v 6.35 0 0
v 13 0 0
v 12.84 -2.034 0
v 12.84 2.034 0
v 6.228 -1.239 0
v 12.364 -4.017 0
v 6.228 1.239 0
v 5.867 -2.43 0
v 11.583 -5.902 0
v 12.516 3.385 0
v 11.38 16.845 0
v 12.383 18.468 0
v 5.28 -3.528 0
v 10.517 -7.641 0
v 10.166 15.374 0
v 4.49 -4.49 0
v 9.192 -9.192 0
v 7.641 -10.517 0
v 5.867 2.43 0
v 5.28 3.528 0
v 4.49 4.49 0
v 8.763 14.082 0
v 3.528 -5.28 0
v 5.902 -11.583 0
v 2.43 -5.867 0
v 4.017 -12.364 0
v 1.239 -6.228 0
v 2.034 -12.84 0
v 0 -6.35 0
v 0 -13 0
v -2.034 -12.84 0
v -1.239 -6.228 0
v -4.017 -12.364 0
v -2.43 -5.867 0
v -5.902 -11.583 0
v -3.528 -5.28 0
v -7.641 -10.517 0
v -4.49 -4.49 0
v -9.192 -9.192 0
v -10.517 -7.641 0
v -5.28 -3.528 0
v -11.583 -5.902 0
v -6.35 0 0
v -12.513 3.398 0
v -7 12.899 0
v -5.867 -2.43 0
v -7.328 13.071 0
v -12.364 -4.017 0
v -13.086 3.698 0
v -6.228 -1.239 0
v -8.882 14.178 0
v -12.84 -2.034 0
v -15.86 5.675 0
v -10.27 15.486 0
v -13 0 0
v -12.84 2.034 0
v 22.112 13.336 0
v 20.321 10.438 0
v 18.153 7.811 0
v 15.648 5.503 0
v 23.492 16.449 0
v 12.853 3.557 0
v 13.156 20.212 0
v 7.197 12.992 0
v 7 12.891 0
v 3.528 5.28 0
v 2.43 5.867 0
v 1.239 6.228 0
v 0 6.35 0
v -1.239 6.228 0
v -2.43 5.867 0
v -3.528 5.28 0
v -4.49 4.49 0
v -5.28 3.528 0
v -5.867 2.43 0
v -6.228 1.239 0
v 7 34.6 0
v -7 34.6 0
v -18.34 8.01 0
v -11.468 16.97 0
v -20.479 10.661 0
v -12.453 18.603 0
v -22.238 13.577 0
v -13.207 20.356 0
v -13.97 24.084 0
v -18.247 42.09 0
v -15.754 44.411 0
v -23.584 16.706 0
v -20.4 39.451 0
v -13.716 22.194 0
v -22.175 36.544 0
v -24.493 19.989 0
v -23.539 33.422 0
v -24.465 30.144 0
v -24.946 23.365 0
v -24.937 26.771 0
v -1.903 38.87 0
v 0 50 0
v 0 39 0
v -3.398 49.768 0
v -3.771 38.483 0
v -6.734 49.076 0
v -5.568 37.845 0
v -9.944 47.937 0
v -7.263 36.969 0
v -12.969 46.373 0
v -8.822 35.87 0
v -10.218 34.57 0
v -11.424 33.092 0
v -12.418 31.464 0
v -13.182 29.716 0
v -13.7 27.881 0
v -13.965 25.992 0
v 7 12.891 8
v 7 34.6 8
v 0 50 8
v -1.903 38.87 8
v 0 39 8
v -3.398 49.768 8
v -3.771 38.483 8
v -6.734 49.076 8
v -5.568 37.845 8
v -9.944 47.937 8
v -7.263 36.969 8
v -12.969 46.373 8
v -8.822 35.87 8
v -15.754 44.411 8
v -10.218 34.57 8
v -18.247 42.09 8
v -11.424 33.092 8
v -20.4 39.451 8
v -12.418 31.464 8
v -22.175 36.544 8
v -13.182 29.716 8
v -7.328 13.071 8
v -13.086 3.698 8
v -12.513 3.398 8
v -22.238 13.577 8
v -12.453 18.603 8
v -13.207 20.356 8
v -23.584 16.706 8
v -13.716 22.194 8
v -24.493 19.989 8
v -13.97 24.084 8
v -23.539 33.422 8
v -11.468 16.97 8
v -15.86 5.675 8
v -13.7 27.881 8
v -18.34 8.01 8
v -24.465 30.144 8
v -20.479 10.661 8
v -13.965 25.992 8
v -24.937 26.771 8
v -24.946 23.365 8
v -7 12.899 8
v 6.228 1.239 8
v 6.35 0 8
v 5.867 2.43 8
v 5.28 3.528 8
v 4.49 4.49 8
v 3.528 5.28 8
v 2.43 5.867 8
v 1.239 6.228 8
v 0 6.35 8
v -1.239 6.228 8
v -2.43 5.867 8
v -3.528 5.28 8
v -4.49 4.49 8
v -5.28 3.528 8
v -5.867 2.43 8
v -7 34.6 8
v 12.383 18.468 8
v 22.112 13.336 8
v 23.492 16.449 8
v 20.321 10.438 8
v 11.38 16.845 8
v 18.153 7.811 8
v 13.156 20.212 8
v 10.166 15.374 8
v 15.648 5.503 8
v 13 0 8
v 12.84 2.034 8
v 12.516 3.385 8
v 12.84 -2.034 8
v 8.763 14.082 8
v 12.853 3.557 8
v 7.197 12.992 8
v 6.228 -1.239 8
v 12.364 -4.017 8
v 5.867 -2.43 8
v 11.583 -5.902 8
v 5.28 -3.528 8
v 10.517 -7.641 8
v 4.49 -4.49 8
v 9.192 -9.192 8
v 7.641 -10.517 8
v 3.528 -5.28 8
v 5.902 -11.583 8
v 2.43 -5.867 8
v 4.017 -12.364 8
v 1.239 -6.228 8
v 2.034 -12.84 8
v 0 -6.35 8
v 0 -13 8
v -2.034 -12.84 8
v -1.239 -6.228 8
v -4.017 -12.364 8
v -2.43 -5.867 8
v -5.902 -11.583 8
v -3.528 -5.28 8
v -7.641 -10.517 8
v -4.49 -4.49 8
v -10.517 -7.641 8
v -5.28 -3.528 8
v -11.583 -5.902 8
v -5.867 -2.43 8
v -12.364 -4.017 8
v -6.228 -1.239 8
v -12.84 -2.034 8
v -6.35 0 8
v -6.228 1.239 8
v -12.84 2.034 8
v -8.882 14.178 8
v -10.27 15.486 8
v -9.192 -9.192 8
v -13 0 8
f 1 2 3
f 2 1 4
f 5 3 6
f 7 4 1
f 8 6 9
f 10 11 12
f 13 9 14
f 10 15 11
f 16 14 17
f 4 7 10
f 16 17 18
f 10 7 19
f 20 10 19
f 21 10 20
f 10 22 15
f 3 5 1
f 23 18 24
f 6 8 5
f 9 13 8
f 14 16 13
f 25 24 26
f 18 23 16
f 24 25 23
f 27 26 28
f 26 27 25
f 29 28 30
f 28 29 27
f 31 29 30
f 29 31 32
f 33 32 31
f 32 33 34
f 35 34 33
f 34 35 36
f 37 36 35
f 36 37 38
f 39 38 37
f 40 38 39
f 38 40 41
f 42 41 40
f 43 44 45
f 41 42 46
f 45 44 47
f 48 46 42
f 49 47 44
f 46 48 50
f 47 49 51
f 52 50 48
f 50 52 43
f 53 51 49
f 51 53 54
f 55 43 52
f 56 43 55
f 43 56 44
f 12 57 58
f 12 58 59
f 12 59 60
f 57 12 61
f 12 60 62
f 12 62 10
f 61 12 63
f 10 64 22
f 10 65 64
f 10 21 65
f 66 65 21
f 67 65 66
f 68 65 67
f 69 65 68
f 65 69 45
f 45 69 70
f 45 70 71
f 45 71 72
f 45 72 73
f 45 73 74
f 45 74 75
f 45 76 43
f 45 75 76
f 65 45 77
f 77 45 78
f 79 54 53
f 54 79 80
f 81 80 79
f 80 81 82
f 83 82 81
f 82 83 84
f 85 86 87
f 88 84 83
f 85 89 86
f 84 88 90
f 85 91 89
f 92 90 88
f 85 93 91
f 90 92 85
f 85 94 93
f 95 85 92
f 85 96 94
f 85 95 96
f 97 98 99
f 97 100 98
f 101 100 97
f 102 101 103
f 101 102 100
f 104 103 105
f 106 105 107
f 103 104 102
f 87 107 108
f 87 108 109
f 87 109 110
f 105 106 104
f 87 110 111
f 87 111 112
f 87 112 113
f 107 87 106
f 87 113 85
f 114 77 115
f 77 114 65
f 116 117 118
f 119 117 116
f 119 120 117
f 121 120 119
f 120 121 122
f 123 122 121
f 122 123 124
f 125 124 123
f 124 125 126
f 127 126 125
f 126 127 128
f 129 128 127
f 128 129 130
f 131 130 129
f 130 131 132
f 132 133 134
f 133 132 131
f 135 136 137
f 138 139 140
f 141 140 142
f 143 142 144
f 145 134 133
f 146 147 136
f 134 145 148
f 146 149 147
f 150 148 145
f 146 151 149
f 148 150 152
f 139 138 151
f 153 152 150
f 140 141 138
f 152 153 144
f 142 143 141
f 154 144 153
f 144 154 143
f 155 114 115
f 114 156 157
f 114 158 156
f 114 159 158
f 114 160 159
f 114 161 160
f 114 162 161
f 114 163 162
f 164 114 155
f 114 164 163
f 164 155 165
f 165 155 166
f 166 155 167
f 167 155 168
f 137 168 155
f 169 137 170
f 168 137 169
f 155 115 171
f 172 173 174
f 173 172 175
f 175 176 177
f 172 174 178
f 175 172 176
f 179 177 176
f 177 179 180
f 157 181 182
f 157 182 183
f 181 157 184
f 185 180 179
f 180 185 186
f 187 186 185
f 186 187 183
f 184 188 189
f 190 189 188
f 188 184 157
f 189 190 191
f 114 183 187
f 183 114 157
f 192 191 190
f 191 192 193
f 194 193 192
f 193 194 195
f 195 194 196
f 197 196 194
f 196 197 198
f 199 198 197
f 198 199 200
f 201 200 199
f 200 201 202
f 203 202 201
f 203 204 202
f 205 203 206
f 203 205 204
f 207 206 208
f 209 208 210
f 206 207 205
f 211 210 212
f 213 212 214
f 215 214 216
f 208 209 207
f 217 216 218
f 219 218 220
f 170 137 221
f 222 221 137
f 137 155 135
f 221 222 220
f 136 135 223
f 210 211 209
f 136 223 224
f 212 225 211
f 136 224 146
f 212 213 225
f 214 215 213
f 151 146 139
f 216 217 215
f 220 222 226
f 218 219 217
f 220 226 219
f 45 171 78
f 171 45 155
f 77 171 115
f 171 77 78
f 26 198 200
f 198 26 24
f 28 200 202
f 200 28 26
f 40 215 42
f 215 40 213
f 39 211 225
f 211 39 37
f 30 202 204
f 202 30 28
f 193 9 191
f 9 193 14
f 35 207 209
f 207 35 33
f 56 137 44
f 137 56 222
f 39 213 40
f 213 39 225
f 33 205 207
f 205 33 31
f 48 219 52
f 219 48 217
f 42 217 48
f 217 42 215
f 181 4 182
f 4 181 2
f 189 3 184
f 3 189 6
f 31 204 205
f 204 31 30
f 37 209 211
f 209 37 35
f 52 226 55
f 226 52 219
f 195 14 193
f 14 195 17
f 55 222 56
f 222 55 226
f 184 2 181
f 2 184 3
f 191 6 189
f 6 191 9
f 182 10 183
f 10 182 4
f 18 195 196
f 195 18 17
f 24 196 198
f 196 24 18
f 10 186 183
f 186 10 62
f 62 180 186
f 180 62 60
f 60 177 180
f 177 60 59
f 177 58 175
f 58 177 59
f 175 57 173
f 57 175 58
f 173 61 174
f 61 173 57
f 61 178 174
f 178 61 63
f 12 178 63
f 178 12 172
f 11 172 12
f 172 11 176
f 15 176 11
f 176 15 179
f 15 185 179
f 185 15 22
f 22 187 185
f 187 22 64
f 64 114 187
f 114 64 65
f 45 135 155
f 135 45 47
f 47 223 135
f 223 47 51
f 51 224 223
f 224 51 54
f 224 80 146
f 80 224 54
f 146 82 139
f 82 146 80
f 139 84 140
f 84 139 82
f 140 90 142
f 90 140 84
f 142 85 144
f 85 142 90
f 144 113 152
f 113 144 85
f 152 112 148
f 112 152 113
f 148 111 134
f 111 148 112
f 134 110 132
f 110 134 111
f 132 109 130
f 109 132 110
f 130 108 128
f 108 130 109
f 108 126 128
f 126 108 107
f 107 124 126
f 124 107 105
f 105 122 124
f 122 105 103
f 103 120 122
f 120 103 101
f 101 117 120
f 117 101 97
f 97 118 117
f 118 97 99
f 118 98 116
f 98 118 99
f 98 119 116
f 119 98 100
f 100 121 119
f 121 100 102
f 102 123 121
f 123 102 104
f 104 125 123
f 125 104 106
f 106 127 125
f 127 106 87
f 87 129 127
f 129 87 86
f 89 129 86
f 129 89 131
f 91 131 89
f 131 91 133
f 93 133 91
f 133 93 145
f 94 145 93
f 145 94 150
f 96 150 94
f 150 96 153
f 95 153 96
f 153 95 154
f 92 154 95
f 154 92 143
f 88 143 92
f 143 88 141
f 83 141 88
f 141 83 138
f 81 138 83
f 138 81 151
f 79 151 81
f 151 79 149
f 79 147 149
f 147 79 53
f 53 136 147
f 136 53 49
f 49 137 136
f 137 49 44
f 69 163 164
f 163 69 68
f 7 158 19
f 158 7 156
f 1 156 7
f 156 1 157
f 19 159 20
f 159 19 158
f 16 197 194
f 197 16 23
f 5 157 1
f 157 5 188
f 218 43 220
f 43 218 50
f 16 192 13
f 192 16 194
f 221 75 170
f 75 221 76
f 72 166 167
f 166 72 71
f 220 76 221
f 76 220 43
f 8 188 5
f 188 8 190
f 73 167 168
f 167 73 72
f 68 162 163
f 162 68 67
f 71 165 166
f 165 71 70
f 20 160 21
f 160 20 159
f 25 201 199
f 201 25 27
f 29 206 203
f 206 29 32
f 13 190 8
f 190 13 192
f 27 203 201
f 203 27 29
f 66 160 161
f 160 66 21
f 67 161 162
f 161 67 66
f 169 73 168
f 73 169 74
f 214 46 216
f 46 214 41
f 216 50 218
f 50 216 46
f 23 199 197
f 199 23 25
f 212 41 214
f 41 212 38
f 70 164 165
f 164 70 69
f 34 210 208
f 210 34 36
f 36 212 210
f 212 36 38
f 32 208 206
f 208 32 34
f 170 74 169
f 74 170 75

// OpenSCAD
$fn = 32;

// ----------------------------------------------------------------------
// Hook: 50 mm shank into a 14 mm curl, 8 mm thick
// ----------------------------------------------------------------------

// --- parameters (mm) ---
shank_len = 50;           // shank length from the boss centre
shank_w = 14;             // shank width
boss_d = 26;              // boss diameter
bore_d = 12.7;            // boss bore
curl_in = 14;             // curl inner radius
curl_out = 25;            // curl outer radius
curl_sweep = 250;         // curl sweep angle
hook_t = 8;               // hook thickness

shank_profile = [[-7, 34.6], [7, 34.6], [7, 11], [-7, 11]];
boss_profile = [[13, 0], [12.84, 2.034], [12.364, 4.017], [11.583, 5.902], [10.517, 7.641], [9.192, 9.192], [7.641, 10.517], [5.902, 11.583], [4.017, 12.364], [2.034, 12.84], [0, 13], [-2.034, 12.84], [-4.017, 12.364], [-5.902, 11.583], [-7.641, 10.517], [-9.192, 9.192], [-10.517, 7.641], [-11.583, 5.902], [-12.364, 4.017], [-12.84, 2.034], [-13, 0], [-12.84, -2.034], [-12.364, -4.017], [-11.583, -5.902], [-10.517, -7.641], [-9.192, -9.192], [-7.641, -10.517], [-5.902, -11.583], [-4.017, -12.364], [-2.034, -12.84], [0, -13], [2.034, -12.84], [4.017, -12.364], [5.902, -11.583], [7.641, -10.517], [9.192, -9.192], [10.517, -7.641], [11.583, -5.902], [12.364, -4.017], [12.84, -2.034]];
curl_profile = [[0, 50], [-3.398, 49.768], [-6.734, 49.076], [-9.944, 47.937], [-12.969, 46.373], [-15.754, 44.411], [-18.247, 42.09], [-20.4, 39.451], [-22.175, 36.544], [-23.539, 33.422], [-24.465, 30.144], [-24.937, 26.771], [-24.946, 23.365], [-24.493, 19.989], [-23.584, 16.706], [-22.238, 13.577], [-20.479, 10.661], [-18.34, 8.01], [-15.86, 5.675], [-13.086, 3.698], [-10.069, 2.117], [-6.865, 0.961], [-3.533, 0.251], [-0.136, 0], [3.263, 0.214], [6.602, 0.888], [9.818, 2.009], [12.853, 3.557], [15.648, 5.503], [18.153, 7.811], [20.321, 10.438], [22.112, 13.336], [23.492, 16.449], [13.156, 20.212], [12.383, 18.468], [11.38, 16.845], [10.166, 15.374], [8.763, 14.082], [7.197, 12.992], [5.498, 12.125], [3.697, 11.497], [1.827, 11.12], [-0.076, 11], [-1.979, 11.141], [-3.844, 11.538], [-5.638, 12.186], [-7.328, 13.071], [-8.882, 14.178], [-10.27, 15.486], [-11.468, 16.97], [-12.453, 18.603], [-13.207, 20.356], [-13.716, 22.194], [-13.97, 24.084], [-13.965, 25.992], [-13.7, 27.881], [-13.182, 29.716], [-12.418, 31.464], [-11.424, 33.092], [-10.218, 34.57], [-8.822, 35.87], [-7.263, 36.969], [-5.568, 37.845], [-3.771, 38.483], [-1.903, 38.87], [0, 39]];

difference() {
  union() {
    /* three overlapping outlines: shank, boss and the smooth curl */
    linear_extrude(height = hook_t) polygon(shank_profile);
    linear_extrude(height = hook_t) polygon(boss_profile);
    linear_extrude(height = hook_t) polygon(curl_profile);
  }
  translate([0, 0, -2.5]) cylinder(h = hook_t + 5, d = bore_d);
}
